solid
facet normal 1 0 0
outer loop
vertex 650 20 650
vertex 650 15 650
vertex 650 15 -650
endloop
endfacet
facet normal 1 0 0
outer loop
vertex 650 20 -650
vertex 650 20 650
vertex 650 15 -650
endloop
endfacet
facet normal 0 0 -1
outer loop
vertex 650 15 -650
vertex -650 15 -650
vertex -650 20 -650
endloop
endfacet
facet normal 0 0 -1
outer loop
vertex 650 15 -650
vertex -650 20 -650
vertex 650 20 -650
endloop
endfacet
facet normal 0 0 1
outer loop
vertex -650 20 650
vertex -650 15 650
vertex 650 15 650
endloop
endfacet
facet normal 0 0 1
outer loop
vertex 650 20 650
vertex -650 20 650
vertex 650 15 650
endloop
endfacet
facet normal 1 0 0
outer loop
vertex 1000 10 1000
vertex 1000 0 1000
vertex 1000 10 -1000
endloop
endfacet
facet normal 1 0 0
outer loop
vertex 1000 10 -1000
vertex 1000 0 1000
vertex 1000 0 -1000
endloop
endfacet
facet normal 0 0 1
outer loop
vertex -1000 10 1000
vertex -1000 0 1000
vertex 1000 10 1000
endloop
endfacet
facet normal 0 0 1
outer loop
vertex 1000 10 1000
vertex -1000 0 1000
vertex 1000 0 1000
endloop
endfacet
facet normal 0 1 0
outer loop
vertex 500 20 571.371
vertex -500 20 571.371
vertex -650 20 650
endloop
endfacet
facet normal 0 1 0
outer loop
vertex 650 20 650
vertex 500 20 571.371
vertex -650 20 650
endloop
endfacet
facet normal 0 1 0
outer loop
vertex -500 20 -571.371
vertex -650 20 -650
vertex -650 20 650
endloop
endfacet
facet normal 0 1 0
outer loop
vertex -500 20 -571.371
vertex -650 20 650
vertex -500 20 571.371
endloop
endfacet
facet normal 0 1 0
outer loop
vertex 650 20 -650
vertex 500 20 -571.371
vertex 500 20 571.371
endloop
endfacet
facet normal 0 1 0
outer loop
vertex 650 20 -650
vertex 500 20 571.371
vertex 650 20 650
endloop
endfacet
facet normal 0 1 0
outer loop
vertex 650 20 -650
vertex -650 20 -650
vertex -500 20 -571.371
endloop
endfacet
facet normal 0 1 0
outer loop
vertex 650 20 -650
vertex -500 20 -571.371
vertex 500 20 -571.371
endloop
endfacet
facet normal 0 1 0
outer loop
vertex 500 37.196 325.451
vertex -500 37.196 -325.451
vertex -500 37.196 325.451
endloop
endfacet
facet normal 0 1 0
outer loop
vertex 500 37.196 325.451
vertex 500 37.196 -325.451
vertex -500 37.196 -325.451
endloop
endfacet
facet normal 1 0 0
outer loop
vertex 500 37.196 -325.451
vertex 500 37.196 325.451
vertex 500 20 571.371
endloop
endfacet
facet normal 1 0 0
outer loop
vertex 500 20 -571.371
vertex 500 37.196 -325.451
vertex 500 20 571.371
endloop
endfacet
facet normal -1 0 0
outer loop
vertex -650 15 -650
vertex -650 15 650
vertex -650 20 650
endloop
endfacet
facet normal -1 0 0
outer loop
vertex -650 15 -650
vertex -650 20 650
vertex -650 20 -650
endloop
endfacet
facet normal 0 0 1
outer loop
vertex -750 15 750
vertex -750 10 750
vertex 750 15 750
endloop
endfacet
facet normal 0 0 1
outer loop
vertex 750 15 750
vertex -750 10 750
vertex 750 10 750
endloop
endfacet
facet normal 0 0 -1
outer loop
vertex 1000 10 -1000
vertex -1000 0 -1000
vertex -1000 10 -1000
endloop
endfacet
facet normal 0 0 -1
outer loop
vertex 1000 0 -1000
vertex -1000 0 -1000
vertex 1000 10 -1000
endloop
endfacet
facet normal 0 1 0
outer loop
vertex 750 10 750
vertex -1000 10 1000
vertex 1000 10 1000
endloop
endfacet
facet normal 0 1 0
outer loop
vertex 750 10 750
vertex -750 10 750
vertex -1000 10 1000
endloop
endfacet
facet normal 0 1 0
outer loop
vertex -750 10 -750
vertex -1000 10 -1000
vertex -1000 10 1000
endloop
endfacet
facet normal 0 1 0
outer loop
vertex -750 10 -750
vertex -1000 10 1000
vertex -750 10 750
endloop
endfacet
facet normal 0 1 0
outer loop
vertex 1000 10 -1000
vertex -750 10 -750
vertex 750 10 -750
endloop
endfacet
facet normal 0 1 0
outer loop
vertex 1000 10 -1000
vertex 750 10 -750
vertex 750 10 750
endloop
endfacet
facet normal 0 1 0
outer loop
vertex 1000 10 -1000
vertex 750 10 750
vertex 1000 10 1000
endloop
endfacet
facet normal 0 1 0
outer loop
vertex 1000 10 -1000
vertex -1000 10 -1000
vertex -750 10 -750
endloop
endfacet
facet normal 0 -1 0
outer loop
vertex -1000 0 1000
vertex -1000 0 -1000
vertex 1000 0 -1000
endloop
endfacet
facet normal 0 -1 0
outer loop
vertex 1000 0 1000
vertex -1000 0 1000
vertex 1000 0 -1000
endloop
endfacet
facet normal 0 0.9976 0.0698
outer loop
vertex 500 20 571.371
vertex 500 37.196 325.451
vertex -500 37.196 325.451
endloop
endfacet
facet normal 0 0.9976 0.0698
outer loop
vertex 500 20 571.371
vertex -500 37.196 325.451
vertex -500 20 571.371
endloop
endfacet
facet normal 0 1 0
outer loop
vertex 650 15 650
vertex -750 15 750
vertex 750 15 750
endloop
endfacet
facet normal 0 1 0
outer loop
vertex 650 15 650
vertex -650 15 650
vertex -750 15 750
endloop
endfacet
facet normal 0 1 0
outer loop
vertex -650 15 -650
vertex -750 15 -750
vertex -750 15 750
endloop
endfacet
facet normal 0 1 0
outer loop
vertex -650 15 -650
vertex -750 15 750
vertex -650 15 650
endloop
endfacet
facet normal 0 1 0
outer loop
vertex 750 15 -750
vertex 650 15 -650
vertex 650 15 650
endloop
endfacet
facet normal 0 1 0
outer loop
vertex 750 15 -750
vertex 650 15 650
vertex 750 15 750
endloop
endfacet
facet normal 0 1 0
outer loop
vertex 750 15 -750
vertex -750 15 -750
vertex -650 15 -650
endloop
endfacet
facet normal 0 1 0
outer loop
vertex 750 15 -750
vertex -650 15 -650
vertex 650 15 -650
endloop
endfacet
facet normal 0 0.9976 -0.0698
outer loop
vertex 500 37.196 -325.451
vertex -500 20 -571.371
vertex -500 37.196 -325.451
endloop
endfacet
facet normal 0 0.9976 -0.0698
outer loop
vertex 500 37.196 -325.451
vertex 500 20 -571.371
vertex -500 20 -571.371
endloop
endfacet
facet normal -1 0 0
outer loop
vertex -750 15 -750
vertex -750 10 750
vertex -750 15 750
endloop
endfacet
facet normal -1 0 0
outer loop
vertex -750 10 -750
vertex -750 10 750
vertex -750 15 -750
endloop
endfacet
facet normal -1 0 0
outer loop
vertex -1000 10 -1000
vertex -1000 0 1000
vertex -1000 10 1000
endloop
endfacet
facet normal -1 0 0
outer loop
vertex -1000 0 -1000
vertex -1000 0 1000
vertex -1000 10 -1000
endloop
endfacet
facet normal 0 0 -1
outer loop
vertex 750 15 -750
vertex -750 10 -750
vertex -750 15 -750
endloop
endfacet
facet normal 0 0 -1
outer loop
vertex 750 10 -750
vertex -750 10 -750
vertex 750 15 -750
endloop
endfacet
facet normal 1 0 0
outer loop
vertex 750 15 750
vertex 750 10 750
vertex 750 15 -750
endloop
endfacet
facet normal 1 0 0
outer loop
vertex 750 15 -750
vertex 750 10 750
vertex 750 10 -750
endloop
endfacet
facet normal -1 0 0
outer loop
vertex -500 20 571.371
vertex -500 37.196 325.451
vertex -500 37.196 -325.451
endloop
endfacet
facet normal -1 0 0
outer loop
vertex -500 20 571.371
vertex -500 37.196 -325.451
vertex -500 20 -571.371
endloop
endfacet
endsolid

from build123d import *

# Parameters (mm, degrees)
ESQUISSE1_W        = 2000
ESQUISSE1_H        = 2000
BOSS_EXTRU_1_DEPTH = 10
ESQUISSE3_W        = 1500
ESQUISSE3_H        = 1500
BOSS_EXTRU_2_DEPTH = 5
ESQUISSE4_W        = 1300
ESQUISSE4_H        = 1300
BOSS_EXTRU_3_DEPTH = 5
BOSS_EXTRU_5_DEPTH = 500


with BuildPart() as part:
    # Esquisse1 → Boss.-Extru.1 (new body)
    with BuildSketch(Plane(origin=(0, 0, 0), x_dir=(1, 0, 0), z_dir=(0, 1, 0))):
        Rectangle(ESQUISSE1_W, ESQUISSE1_H)
    extrude(amount=BOSS_EXTRU_1_DEPTH)

    # Esquisse3 → Boss.-Extru.2 (add)
    with BuildSketch(Plane(origin=(0, 10, 0), x_dir=(1, 0, 0), z_dir=(0, 1, 0))):
        Rectangle(ESQUISSE3_W, ESQUISSE3_H)
    extrude(amount=BOSS_EXTRU_2_DEPTH)

    # Esquisse4 → Boss.-Extru.3 (add)
    with BuildSketch(Plane(origin=(0, 15, 0), x_dir=(1, 0, 0), z_dir=(0, 1, 0))):
        Rectangle(ESQUISSE4_W, ESQUISSE4_H)
    extrude(amount=BOSS_EXTRU_3_DEPTH)

    # Esquisse8 → Boss.-Extru.5 (add, symmetric)
    with BuildSketch(Plane(origin=(0, 0, 0), x_dir=(0, 0, -1), z_dir=(1, 0, 0))):
        Polygon((325.45099137, 37.196428785), (-325.45099137, 37.196428785), (-571.371380234, 20), (571.371380234, 20), align=None)
    extrude(amount=BOSS_EXTRU_5_DEPTH, both=True)


solid = part.part
